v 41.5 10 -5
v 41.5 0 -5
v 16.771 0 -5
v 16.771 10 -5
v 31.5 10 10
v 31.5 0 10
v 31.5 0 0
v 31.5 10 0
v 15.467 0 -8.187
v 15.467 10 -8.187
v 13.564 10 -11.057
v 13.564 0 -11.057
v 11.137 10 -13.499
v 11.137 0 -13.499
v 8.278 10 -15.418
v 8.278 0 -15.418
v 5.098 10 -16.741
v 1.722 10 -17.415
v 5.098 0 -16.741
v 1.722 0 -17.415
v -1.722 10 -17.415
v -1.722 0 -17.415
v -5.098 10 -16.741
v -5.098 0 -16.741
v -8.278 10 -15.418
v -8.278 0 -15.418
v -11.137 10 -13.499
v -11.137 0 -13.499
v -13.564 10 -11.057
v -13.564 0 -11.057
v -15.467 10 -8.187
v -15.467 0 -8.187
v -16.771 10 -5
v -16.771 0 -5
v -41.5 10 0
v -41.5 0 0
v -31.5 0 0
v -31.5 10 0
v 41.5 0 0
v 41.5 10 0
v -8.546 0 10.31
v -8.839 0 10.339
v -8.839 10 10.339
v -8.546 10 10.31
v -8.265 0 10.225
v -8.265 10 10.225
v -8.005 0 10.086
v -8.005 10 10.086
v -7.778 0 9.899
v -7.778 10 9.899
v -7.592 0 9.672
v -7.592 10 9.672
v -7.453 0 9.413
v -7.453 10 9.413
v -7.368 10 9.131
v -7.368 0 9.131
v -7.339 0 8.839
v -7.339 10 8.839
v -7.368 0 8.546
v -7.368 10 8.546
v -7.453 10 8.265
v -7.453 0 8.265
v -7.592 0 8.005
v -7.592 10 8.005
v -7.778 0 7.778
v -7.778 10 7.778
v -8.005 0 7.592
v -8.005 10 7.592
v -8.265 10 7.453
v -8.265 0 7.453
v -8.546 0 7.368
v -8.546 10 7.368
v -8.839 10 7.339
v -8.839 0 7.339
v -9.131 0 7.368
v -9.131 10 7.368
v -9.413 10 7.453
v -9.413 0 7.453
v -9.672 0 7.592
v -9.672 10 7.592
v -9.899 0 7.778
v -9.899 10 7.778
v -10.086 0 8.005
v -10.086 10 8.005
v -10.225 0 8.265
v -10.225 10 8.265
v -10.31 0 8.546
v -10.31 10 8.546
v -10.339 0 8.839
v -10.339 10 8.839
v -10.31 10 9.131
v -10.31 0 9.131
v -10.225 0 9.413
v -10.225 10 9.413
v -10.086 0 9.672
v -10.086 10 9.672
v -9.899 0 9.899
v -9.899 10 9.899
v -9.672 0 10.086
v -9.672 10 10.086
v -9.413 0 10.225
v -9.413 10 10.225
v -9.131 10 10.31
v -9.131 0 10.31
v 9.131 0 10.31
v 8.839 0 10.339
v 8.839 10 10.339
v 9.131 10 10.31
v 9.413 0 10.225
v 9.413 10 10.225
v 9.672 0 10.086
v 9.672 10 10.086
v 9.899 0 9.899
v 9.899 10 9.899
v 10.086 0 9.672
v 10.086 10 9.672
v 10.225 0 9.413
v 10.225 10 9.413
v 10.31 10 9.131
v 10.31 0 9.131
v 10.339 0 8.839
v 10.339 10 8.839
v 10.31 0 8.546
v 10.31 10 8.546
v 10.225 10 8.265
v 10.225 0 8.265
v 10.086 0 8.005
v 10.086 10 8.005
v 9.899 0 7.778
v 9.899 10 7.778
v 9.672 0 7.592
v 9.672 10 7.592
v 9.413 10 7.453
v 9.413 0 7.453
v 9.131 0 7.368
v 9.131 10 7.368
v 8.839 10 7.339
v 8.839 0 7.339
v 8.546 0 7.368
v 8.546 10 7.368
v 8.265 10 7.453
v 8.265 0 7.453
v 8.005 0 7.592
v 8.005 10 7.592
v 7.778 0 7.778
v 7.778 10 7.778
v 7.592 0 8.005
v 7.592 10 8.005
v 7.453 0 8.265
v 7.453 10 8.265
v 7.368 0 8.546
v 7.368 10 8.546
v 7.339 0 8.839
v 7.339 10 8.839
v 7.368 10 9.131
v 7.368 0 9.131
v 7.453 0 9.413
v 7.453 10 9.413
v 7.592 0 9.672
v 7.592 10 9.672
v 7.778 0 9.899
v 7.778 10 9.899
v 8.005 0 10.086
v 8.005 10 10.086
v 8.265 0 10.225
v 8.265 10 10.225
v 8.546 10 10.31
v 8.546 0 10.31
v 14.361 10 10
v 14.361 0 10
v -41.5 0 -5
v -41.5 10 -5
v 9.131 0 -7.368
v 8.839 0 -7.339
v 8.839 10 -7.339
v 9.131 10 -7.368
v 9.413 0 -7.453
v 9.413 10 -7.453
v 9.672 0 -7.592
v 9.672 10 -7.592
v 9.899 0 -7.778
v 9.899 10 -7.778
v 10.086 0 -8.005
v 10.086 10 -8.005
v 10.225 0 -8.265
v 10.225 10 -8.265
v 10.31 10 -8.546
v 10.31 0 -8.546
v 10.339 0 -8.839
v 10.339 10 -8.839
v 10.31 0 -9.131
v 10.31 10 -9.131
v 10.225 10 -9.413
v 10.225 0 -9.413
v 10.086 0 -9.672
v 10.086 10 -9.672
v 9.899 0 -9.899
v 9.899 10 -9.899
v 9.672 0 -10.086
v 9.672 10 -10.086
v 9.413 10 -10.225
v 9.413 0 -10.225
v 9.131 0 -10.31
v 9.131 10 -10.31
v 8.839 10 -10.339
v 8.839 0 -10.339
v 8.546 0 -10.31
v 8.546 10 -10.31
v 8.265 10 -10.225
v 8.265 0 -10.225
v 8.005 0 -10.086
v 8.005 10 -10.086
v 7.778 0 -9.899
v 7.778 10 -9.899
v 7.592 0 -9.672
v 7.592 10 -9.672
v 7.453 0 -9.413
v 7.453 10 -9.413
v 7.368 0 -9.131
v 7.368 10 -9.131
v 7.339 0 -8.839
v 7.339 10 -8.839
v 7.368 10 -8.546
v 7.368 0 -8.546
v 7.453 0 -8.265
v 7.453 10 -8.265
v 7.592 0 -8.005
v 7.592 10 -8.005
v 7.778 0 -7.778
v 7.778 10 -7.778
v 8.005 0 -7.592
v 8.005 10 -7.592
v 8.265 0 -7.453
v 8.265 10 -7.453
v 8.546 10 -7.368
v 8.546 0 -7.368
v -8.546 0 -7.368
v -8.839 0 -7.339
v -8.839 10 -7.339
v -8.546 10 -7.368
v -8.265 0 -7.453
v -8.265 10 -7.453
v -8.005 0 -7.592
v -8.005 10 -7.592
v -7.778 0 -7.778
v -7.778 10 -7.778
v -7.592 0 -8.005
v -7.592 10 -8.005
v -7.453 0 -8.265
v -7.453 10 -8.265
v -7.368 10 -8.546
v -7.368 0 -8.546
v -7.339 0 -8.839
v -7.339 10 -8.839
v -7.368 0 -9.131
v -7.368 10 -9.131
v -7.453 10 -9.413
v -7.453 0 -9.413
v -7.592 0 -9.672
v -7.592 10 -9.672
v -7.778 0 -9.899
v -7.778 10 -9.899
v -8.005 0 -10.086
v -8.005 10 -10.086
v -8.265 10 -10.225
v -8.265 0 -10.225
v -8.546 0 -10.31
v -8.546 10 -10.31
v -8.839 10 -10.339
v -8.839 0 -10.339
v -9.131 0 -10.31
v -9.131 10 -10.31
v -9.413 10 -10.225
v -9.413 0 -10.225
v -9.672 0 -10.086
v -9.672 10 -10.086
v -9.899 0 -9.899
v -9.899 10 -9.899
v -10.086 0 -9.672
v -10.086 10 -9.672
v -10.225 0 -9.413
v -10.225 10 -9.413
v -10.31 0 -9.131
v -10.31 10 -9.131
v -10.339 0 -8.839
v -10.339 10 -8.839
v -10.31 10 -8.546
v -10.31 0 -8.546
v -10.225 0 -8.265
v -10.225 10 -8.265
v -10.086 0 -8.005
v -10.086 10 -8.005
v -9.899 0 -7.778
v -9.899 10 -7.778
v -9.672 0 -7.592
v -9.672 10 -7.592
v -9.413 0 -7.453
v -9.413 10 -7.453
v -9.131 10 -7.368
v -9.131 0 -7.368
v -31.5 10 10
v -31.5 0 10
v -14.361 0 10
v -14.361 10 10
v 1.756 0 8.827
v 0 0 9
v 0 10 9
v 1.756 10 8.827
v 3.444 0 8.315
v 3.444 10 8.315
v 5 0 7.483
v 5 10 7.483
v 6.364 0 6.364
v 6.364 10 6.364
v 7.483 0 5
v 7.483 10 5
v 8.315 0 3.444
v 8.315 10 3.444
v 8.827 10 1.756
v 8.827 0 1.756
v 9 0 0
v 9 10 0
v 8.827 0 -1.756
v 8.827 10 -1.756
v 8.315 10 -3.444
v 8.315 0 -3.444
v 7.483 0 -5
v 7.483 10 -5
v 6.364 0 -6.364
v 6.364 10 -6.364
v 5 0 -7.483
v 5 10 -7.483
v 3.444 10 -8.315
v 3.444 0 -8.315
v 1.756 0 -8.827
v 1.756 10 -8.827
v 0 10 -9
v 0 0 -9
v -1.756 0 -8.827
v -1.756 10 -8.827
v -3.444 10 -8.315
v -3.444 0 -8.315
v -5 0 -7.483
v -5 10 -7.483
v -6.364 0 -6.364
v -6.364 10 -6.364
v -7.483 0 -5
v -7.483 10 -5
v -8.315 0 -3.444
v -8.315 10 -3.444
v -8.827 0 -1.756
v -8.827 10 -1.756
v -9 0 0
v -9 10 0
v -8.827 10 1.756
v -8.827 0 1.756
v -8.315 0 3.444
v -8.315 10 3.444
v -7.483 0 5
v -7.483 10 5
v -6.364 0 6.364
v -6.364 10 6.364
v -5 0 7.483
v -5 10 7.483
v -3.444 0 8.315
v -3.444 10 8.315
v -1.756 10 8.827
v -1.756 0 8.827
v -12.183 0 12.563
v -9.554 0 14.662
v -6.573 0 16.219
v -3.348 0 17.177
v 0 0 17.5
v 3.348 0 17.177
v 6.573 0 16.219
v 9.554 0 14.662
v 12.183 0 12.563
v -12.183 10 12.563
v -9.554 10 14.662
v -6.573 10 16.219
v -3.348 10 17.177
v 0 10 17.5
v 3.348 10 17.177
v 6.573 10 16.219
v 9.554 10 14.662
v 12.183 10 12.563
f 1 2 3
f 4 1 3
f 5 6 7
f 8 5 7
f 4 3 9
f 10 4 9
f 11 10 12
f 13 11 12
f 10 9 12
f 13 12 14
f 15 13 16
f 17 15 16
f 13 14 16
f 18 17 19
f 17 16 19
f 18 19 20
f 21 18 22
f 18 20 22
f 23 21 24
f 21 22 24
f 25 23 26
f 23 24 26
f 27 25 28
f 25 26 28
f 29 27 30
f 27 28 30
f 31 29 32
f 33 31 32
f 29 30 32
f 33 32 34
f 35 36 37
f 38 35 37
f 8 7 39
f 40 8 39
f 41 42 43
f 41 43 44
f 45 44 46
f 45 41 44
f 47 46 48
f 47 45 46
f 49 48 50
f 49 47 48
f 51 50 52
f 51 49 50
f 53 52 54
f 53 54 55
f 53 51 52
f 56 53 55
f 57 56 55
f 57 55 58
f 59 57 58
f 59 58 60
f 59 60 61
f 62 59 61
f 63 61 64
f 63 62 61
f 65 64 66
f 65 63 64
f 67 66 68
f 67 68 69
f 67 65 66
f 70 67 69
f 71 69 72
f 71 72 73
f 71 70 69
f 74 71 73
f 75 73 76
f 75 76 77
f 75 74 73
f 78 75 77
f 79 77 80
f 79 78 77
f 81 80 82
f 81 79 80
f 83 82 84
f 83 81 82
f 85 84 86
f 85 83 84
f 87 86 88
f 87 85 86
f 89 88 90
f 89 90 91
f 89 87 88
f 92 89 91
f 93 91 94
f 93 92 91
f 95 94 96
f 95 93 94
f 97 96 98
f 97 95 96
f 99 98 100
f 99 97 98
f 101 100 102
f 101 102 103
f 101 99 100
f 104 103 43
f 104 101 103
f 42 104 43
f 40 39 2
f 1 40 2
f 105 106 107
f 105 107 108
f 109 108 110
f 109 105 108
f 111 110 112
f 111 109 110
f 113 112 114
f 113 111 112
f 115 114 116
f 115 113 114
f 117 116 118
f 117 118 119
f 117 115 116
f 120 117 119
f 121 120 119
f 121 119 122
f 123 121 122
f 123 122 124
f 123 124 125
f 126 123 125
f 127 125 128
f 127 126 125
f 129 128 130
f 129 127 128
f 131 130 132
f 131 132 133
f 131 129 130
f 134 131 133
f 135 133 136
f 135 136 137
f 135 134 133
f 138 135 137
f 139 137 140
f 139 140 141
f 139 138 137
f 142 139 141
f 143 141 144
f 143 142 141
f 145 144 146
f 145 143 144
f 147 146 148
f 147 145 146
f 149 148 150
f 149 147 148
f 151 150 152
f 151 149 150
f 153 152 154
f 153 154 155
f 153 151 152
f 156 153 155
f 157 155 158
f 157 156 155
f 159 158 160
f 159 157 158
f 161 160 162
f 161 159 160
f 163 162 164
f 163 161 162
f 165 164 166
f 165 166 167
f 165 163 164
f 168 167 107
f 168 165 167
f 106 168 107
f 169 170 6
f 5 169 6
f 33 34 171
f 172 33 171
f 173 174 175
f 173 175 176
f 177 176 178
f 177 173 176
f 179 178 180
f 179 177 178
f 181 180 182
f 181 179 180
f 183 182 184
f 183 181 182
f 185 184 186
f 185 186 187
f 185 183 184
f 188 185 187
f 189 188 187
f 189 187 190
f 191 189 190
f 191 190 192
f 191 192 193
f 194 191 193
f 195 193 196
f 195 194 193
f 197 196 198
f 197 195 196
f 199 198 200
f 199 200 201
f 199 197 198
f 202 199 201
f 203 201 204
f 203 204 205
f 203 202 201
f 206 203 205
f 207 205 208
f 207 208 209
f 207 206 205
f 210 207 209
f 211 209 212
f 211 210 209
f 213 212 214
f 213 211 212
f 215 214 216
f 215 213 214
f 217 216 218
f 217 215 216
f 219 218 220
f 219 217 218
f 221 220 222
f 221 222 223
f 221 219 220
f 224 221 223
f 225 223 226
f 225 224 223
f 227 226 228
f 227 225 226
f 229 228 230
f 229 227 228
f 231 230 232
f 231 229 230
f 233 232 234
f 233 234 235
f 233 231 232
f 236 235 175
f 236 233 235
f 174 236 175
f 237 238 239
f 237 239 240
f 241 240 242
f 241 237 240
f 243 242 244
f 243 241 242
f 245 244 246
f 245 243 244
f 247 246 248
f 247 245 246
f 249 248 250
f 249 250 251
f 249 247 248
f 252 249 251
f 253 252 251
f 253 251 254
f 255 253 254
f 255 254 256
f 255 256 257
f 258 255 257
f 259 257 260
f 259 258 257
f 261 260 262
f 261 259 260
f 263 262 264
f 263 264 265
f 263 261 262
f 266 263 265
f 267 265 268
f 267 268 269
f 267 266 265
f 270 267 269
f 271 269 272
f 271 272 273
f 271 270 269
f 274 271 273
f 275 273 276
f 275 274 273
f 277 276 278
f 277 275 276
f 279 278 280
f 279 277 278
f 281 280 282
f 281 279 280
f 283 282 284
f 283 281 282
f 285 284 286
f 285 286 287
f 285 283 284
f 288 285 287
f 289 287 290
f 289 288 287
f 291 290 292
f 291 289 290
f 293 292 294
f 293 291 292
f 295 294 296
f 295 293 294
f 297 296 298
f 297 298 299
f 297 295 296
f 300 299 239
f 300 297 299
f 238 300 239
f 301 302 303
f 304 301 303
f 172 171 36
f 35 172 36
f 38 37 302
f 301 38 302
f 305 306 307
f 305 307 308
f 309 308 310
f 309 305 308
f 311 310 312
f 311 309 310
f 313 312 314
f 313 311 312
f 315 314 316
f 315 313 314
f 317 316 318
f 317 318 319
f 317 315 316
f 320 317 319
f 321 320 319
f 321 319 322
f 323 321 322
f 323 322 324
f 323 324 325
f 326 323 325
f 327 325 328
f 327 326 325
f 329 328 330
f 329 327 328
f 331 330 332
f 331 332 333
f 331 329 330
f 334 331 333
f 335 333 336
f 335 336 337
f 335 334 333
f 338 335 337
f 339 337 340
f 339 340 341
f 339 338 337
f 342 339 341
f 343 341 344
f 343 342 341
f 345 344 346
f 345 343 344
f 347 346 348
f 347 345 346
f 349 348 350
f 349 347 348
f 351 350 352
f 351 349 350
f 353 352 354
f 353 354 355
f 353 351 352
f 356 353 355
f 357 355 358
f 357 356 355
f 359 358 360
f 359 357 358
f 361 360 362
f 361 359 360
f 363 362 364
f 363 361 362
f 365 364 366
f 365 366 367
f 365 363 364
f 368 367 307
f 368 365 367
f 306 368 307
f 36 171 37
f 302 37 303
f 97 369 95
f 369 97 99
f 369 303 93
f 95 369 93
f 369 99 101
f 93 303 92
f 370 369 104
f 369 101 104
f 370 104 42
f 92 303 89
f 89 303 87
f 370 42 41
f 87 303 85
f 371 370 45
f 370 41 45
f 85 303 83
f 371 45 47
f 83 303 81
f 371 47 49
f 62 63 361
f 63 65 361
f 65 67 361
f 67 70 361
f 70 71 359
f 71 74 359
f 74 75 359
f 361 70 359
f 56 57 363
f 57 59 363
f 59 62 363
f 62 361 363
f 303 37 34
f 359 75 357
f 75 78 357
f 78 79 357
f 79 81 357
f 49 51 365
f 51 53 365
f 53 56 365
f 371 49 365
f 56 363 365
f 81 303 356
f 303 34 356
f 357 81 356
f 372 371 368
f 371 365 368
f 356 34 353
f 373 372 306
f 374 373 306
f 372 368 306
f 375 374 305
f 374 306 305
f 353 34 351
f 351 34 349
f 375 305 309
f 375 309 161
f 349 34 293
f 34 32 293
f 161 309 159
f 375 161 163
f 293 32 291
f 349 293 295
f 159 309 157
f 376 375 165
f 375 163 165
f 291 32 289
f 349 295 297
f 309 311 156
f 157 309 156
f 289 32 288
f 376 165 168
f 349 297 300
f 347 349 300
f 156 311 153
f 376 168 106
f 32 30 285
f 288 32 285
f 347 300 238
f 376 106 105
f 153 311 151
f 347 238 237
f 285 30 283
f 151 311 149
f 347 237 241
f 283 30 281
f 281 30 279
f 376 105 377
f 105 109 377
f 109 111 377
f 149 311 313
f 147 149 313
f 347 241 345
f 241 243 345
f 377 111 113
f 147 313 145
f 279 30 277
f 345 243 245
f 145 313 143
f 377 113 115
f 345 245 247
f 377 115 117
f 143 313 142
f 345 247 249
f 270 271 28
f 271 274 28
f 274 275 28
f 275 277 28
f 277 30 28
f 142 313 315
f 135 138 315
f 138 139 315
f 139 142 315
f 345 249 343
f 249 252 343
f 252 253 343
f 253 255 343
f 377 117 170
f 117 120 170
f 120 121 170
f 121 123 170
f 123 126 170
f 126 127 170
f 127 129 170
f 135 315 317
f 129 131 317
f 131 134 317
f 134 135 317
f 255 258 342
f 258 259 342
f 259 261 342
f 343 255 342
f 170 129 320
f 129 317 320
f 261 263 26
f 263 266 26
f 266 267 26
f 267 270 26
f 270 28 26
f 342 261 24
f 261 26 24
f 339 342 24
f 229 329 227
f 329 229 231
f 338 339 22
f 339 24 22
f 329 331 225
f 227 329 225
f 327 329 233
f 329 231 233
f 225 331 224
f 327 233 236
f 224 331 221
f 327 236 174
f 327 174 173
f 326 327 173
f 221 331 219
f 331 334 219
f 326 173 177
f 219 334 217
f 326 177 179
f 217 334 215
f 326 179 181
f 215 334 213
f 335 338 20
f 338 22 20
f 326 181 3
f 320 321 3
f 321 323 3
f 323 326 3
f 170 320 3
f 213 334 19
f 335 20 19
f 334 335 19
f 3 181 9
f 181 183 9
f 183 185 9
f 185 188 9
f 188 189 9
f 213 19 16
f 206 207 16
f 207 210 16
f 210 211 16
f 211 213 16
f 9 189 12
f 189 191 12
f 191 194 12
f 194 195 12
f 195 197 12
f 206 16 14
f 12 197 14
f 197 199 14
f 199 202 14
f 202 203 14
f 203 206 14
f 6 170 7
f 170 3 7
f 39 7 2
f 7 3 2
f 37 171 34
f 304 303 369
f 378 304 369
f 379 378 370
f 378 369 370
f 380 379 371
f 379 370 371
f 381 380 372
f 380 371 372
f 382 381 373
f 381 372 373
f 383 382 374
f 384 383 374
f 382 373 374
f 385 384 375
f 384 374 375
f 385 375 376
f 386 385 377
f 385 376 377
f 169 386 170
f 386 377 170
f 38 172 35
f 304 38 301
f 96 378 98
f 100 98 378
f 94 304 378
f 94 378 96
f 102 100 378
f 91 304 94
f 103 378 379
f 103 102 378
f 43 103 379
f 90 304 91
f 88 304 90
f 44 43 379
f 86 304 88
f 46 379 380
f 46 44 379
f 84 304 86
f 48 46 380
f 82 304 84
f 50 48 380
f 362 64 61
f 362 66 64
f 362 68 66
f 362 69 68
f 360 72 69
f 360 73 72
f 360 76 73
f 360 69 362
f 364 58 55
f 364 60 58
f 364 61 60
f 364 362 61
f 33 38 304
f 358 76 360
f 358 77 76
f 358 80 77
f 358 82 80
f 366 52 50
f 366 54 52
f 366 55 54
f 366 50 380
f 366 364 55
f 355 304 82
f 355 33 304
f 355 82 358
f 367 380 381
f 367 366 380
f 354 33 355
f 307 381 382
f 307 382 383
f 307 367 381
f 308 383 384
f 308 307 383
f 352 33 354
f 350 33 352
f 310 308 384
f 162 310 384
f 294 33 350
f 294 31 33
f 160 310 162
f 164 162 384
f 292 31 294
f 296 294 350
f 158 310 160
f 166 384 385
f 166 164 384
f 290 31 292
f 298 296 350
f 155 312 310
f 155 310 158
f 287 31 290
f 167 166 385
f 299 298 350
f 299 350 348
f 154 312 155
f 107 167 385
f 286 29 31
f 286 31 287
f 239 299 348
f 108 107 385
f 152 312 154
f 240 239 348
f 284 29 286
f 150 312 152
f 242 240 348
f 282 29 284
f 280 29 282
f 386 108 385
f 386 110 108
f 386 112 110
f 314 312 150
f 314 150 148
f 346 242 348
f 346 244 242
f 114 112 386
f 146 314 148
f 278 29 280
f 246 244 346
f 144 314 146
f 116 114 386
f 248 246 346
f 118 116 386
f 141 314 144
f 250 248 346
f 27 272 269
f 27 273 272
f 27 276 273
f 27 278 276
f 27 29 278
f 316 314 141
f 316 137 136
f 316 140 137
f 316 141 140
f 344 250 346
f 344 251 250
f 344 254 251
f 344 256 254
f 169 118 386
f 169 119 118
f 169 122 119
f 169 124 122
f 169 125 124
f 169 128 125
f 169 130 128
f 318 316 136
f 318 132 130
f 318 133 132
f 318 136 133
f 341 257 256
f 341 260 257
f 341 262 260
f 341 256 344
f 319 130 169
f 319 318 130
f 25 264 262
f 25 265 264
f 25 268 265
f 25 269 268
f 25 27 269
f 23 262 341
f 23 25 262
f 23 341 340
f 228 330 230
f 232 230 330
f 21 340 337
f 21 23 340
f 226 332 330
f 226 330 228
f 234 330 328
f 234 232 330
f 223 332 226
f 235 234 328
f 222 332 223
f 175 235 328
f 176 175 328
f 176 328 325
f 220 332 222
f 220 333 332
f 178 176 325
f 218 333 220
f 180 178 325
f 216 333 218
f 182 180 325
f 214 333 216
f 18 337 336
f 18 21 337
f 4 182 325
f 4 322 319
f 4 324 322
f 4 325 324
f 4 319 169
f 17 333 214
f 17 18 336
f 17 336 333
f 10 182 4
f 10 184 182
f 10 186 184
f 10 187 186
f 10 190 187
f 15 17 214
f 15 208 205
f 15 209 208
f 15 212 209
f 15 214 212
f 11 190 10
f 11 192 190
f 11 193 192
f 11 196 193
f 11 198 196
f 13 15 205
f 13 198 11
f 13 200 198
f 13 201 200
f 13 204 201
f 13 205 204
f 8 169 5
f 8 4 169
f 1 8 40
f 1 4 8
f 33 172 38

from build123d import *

# Parameters (mm, degrees)
SKETCH_1_R      = 9
SKETCH_1_R_2    = 1.5
EXTRUDE_1_DEPTH = 10


with BuildPart() as part:
    # Эскиз1 → Бобышка-Вытянуть1 (new body)
    with BuildSketch(Plane(origin=(0, 0, 0), x_dir=(1, 0, 0), z_dir=(0, 1, 0))):
        with BuildLine():
            Line((-31.5, 0), (-31.5, -10))
            Line((-31.5, -10), (-14.361406616, -10))
            ThreePointArc((-14.361406616, -10), (0, -17.5), (14.361406616, -10))
            Line((14.361406616, -10), (31.5, -10))
            Line((31.5, -10), (31.5, 0))
            Line((31.5, 0), (41.5, 0))
            Line((41.5, 0), (41.5, 5))
            Line((41.5, 5), (16.770509831, 5))
            ThreePointArc((16.770509831, 5), (0, 17.5), (-16.770509831, 5))
            Line((-16.770509831, 5), (-41.5, 5))
            Line((-41.5, 5), (-41.5, 0))
            Line((-41.5, 0), (-31.5, 0))
        make_face()
        with Locations(Location((0, 0, 0), (0, 0, 270))):
            Circle(SKETCH_1_R, mode=Mode.SUBTRACT)
        with Locations(Location((-8.838834765, 8.838834765, 0), (0, 0, 270))):
            Circle(SKETCH_1_R_2, mode=Mode.SUBTRACT)
        with Locations(Location((8.838834765, 8.838834765, 0), (0, 0, 270))):
            Circle(SKETCH_1_R_2, mode=Mode.SUBTRACT)
        with Locations(Location((8.838834765, -8.838834765, 0), (0, 0, 270))):
            Circle(SKETCH_1_R_2, mode=Mode.SUBTRACT)
        with Locations(Location((-8.838834765, -8.838834765, 0), (0, 0, 270))):
            Circle(SKETCH_1_R_2, mode=Mode.SUBTRACT)
    extrude(amount=EXTRUDE_1_DEPTH)


solid = part.part
